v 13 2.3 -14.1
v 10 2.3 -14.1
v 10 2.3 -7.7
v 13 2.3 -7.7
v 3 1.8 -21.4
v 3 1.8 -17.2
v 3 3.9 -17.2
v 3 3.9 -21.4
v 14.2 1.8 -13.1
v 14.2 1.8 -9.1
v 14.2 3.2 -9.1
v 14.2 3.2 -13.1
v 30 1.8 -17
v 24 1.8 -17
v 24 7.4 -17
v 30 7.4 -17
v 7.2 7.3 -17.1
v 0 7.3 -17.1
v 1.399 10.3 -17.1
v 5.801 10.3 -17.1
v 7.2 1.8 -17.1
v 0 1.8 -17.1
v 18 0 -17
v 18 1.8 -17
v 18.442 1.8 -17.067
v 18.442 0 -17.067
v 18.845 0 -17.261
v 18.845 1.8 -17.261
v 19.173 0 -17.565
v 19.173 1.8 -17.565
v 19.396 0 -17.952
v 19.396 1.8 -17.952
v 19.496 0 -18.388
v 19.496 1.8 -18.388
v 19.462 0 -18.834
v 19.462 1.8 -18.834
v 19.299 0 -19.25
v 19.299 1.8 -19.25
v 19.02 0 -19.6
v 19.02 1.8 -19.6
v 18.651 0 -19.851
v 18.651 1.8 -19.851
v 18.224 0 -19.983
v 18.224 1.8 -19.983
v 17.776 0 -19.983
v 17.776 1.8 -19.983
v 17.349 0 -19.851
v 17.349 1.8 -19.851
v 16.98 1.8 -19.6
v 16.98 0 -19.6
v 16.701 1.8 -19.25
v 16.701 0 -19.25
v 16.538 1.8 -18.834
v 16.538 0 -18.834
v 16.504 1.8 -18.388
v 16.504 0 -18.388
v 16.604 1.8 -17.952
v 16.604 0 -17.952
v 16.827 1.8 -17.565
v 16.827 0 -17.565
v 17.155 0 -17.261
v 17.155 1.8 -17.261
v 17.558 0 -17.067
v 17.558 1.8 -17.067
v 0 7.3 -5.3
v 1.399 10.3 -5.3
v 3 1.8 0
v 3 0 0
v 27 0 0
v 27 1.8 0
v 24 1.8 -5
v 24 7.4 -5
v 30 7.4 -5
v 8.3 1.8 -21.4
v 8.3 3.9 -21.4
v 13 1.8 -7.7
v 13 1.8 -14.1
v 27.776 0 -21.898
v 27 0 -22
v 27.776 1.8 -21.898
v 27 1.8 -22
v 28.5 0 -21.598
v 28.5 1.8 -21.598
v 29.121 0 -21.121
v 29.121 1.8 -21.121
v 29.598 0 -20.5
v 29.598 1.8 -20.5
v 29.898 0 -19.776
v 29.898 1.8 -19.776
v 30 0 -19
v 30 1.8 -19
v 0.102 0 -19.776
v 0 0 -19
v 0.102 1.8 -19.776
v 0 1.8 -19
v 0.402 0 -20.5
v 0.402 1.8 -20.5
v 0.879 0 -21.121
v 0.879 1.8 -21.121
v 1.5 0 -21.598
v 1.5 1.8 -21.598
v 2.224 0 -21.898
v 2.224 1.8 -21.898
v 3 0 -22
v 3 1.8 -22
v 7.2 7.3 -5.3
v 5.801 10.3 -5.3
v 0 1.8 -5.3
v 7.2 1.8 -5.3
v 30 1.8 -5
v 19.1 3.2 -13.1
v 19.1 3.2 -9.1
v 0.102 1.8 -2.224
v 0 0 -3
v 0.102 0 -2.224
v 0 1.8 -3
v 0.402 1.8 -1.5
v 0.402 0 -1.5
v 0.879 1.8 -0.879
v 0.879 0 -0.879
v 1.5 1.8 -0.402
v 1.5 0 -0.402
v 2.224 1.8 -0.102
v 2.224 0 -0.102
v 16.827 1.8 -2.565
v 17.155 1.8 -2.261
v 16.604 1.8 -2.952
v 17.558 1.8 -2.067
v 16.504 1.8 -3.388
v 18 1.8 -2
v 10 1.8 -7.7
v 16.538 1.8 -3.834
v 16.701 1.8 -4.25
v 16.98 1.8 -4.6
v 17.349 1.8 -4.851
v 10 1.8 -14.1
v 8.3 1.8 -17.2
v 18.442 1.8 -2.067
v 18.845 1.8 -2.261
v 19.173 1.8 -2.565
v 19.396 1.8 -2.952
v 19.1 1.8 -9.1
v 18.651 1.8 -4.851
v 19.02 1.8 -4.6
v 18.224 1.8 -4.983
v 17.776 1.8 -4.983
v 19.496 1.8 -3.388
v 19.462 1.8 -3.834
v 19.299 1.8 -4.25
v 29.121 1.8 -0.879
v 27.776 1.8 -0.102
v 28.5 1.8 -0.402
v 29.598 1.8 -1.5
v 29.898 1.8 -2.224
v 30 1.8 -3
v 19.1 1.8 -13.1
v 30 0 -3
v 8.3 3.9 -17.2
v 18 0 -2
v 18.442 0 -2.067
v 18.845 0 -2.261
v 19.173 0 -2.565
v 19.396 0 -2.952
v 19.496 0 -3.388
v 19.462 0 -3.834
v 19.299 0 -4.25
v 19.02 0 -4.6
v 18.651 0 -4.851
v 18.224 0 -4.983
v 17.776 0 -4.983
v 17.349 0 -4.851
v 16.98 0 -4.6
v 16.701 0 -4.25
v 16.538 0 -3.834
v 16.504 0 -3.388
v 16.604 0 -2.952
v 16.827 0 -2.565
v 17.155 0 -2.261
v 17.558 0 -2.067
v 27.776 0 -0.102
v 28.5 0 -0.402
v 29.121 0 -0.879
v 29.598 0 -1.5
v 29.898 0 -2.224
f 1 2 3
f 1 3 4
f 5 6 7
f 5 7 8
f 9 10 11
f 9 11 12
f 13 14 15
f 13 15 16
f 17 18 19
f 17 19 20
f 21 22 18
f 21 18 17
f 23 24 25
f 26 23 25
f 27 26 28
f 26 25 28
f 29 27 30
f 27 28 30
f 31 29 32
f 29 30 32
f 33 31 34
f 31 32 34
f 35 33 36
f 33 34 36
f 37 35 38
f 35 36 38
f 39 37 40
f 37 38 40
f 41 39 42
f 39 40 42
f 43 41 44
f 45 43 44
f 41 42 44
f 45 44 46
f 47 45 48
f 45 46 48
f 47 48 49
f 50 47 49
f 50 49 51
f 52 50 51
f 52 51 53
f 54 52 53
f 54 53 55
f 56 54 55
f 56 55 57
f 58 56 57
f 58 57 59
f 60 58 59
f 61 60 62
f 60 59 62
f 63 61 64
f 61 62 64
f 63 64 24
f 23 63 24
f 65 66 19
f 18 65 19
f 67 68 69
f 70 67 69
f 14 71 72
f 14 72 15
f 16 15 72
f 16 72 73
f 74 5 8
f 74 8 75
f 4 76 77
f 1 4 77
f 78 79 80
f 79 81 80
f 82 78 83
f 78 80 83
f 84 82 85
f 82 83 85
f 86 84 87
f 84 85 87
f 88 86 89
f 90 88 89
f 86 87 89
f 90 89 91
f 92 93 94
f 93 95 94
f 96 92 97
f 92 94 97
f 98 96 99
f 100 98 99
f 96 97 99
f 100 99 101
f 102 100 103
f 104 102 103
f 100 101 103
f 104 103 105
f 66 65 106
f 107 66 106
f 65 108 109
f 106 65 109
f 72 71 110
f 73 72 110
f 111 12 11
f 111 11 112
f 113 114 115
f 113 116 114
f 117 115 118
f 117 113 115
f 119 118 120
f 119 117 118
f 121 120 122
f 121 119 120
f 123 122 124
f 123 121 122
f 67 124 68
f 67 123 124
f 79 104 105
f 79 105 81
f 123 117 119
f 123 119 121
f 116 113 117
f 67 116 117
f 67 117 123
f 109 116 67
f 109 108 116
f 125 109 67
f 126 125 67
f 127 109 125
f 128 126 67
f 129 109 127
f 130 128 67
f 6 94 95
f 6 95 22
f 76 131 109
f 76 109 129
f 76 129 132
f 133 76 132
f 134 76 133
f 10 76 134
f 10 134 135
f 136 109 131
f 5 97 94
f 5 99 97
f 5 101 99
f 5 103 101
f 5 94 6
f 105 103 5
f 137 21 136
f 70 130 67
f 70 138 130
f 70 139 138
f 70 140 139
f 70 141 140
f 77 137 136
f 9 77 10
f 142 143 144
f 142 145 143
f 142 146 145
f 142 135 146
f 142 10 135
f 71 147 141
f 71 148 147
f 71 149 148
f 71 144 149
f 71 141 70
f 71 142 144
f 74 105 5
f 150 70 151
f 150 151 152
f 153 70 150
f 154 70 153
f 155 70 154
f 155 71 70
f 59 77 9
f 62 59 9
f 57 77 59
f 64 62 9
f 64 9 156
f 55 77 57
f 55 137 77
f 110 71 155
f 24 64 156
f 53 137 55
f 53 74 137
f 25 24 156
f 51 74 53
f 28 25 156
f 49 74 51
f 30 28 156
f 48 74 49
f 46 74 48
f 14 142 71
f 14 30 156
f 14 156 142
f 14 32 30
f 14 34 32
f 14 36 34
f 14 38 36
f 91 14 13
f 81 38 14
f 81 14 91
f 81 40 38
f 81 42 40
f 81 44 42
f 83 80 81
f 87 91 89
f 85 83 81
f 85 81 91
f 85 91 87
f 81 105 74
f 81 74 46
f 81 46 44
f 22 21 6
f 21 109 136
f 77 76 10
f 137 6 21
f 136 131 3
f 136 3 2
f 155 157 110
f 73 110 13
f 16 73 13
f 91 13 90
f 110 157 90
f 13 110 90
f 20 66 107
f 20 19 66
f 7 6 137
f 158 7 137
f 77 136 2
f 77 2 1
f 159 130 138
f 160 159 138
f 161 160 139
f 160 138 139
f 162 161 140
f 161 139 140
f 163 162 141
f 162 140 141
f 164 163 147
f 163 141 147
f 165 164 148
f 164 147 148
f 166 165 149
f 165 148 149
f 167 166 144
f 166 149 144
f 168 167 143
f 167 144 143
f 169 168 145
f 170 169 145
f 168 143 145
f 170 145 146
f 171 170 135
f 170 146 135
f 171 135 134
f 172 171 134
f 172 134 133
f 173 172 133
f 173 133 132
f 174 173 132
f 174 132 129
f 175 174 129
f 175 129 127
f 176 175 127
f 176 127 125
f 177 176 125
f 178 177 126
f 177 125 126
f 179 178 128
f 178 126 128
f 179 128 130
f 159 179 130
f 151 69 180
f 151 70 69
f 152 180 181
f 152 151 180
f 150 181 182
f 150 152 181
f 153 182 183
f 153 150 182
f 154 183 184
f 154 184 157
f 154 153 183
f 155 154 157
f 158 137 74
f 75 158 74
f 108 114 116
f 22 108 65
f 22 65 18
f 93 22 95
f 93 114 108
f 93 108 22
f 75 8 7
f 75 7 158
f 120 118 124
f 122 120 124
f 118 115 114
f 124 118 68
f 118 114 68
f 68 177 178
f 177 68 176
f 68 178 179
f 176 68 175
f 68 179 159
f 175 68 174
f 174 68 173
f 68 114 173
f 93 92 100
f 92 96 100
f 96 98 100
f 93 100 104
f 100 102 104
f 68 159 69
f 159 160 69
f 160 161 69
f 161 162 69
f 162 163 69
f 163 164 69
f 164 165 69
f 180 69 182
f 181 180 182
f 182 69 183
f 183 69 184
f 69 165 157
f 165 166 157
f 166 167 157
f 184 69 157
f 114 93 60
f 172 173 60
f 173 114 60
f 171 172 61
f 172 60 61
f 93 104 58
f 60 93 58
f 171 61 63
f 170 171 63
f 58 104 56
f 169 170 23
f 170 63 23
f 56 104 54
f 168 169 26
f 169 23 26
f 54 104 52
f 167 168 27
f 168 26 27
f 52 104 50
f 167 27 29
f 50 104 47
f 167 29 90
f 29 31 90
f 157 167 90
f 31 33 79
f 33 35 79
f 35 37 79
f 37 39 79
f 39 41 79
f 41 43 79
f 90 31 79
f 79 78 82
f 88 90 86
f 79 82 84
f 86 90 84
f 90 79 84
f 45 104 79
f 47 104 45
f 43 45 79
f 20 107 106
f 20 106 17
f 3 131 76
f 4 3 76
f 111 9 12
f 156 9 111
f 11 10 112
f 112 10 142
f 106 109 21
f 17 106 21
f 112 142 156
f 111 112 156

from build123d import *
from OCP.BRepFilletAPI import BRepFilletAPI_MakeChamfer

# Parameters (mm, degrees)
SKETCH1_W           = 30
SKETCH1_H           = 22
BOSS_EXTRUDE1_DEPTH = 1.8
SKETCH2_R           = 1.5
CUT_EXTRUDE1_DEPTH  = 1.8
SKETCH3_W           = 7.2
SKETCH3_H           = 11.8
BOSS_EXTRUDE2_DEPTH = 8.5
SKETCH4_W           = 6
SKETCH4_H           = 12
BOSS_EXTRUDE3_DEPTH = 5.6
SKETCH5_W           = 5.3
SKETCH5_H           = 4.2
BOSS_EXTRUDE4_DEPTH = 2.1
SKETCH6_W           = 4.9
SKETCH6_H           = 4
BOSS_EXTRUDE5_DEPTH = 1.4
SKETCH7_W           = 3
SKETCH7_H           = 6.4
BOSS_EXTRUDE6_DEPTH = 0.5
FILLET1_R           = 3
CHAMFER1_SIZE       = 3
CHAMFER1_SIZE2      = 1.398922974


with BuildPart() as part:
    # Sketch1 → Boss-Extrude1 (new body)
    with BuildSketch(Plane(origin=(0, 0, 0), x_dir=(1, 0, 0), z_dir=(0, 1, 0))):
        with Locations((15, 11)):
            Rectangle(SKETCH1_W, SKETCH1_H)
    extrude(amount=BOSS_EXTRUDE1_DEPTH)

    # Sketch2 → Cut-Extrude1 (cut)
    with BuildSketch(Plane(origin=(0, 1.8, 0), x_dir=(1, 0, 0), z_dir=(0, 1, 0))):
        with Locations(Location((18, 18.5, 0), (0, 0, 270))):
            Circle(SKETCH2_R)
        with Locations(Location((18, 3.5, 0), (0, 0, 270))):
            Circle(SKETCH2_R)
    extrude(amount=-CUT_EXTRUDE1_DEPTH, mode=Mode.SUBTRACT)

    # Sketch3 → Boss-Extrude2 (add)
    with BuildSketch(Plane(origin=(0, 1.8, 0), x_dir=(1, 0, 0), z_dir=(0, 1, 0))):
        with Locations((3.6, 11.2)):
            Rectangle(SKETCH3_W, SKETCH3_H)
    extrude(amount=BOSS_EXTRUDE2_DEPTH)

    # Sketch4 → Boss-Extrude3 (add)
    with BuildSketch(Plane(origin=(0, 1.8, 0), x_dir=(1, 0, 0), z_dir=(0, 1, 0))):
        with Locations((27, 11)):
            Rectangle(SKETCH4_W, SKETCH4_H)
    extrude(amount=BOSS_EXTRUDE3_DEPTH)

    # Sketch5 → Boss-Extrude4 (add)
    with BuildSketch(Plane(origin=(0, 1.8, 0), x_dir=(1, 0, 0), z_dir=(0, 1, 0))):
        with Locations((5.65, 19.3)):
            Rectangle(SKETCH5_W, SKETCH5_H)
    extrude(amount=BOSS_EXTRUDE4_DEPTH)

    # Sketch6 → Boss-Extrude5 (add)
    with BuildSketch(Plane(origin=(0, 1.8, 0), x_dir=(1, 0, 0), z_dir=(0, 1, 0))):
        with Locations((16.65, 11.1)):
            Rectangle(SKETCH6_W, SKETCH6_H)
    extrude(amount=BOSS_EXTRUDE5_DEPTH)

    # Sketch7 → Boss-Extrude6 (add)
    with BuildSketch(Plane(origin=(0, 1.8, 0), x_dir=(1, 0, 0), z_dir=(0, 1, 0))):
        with Locations((11.5, 10.9)):
            Rectangle(SKETCH7_W, SKETCH7_H)
    extrude(amount=BOSS_EXTRUDE6_DEPTH)

    # Fillet1
    fillet1_edges = [part.edges().sort_by_distance(p)[0] for p in [
        (0, 0.9, -22),
        (30, 0.9, -22),
        (30, 0.9, 0),
        (0, 0.9, 0),
    ]]
    fillet(fillet1_edges, radius=FILLET1_R)

    # Chamfer1: one chamfer whose edges measure the first distance from different faces: ONE call of the kernel's chamfer builder (chamfer() names one face for all edges)
    chamfer1_edges_1 = [part.edges().sort_by_distance(p)[0] for p in [
        (0, 10.3, -11.2),
    ]]
    chamfer1_side_1 = [part.faces().sort_by_distance(p)[0] for p in [
        (0, 4.90112316, -11.155383424),
    ]]
    chamfer1_edges_2 = [part.edges().sort_by_distance(p)[0] for p in [
        (7.2, 10.3, -11.2),
    ]]
    chamfer1_side_2 = [part.faces().sort_by_distance(p)[0] for p in [
        (7.2, 6.05, -11.2),
    ]]
    chamfer1 = BRepFilletAPI_MakeChamfer(part.part.solid().wrapped)
    for e in chamfer1_edges_1:
        chamfer1.Add(CHAMFER1_SIZE, CHAMFER1_SIZE2, e.wrapped, chamfer1_side_1[0].wrapped)  # the first distance lies on this face
    for e in chamfer1_edges_2:
        chamfer1.Add(CHAMFER1_SIZE, CHAMFER1_SIZE2, e.wrapped, chamfer1_side_2[0].wrapped)  # the first distance lies on this face
    add(Compound.cast(chamfer1.Shape()), mode=Mode.REPLACE)


solid = part.part
